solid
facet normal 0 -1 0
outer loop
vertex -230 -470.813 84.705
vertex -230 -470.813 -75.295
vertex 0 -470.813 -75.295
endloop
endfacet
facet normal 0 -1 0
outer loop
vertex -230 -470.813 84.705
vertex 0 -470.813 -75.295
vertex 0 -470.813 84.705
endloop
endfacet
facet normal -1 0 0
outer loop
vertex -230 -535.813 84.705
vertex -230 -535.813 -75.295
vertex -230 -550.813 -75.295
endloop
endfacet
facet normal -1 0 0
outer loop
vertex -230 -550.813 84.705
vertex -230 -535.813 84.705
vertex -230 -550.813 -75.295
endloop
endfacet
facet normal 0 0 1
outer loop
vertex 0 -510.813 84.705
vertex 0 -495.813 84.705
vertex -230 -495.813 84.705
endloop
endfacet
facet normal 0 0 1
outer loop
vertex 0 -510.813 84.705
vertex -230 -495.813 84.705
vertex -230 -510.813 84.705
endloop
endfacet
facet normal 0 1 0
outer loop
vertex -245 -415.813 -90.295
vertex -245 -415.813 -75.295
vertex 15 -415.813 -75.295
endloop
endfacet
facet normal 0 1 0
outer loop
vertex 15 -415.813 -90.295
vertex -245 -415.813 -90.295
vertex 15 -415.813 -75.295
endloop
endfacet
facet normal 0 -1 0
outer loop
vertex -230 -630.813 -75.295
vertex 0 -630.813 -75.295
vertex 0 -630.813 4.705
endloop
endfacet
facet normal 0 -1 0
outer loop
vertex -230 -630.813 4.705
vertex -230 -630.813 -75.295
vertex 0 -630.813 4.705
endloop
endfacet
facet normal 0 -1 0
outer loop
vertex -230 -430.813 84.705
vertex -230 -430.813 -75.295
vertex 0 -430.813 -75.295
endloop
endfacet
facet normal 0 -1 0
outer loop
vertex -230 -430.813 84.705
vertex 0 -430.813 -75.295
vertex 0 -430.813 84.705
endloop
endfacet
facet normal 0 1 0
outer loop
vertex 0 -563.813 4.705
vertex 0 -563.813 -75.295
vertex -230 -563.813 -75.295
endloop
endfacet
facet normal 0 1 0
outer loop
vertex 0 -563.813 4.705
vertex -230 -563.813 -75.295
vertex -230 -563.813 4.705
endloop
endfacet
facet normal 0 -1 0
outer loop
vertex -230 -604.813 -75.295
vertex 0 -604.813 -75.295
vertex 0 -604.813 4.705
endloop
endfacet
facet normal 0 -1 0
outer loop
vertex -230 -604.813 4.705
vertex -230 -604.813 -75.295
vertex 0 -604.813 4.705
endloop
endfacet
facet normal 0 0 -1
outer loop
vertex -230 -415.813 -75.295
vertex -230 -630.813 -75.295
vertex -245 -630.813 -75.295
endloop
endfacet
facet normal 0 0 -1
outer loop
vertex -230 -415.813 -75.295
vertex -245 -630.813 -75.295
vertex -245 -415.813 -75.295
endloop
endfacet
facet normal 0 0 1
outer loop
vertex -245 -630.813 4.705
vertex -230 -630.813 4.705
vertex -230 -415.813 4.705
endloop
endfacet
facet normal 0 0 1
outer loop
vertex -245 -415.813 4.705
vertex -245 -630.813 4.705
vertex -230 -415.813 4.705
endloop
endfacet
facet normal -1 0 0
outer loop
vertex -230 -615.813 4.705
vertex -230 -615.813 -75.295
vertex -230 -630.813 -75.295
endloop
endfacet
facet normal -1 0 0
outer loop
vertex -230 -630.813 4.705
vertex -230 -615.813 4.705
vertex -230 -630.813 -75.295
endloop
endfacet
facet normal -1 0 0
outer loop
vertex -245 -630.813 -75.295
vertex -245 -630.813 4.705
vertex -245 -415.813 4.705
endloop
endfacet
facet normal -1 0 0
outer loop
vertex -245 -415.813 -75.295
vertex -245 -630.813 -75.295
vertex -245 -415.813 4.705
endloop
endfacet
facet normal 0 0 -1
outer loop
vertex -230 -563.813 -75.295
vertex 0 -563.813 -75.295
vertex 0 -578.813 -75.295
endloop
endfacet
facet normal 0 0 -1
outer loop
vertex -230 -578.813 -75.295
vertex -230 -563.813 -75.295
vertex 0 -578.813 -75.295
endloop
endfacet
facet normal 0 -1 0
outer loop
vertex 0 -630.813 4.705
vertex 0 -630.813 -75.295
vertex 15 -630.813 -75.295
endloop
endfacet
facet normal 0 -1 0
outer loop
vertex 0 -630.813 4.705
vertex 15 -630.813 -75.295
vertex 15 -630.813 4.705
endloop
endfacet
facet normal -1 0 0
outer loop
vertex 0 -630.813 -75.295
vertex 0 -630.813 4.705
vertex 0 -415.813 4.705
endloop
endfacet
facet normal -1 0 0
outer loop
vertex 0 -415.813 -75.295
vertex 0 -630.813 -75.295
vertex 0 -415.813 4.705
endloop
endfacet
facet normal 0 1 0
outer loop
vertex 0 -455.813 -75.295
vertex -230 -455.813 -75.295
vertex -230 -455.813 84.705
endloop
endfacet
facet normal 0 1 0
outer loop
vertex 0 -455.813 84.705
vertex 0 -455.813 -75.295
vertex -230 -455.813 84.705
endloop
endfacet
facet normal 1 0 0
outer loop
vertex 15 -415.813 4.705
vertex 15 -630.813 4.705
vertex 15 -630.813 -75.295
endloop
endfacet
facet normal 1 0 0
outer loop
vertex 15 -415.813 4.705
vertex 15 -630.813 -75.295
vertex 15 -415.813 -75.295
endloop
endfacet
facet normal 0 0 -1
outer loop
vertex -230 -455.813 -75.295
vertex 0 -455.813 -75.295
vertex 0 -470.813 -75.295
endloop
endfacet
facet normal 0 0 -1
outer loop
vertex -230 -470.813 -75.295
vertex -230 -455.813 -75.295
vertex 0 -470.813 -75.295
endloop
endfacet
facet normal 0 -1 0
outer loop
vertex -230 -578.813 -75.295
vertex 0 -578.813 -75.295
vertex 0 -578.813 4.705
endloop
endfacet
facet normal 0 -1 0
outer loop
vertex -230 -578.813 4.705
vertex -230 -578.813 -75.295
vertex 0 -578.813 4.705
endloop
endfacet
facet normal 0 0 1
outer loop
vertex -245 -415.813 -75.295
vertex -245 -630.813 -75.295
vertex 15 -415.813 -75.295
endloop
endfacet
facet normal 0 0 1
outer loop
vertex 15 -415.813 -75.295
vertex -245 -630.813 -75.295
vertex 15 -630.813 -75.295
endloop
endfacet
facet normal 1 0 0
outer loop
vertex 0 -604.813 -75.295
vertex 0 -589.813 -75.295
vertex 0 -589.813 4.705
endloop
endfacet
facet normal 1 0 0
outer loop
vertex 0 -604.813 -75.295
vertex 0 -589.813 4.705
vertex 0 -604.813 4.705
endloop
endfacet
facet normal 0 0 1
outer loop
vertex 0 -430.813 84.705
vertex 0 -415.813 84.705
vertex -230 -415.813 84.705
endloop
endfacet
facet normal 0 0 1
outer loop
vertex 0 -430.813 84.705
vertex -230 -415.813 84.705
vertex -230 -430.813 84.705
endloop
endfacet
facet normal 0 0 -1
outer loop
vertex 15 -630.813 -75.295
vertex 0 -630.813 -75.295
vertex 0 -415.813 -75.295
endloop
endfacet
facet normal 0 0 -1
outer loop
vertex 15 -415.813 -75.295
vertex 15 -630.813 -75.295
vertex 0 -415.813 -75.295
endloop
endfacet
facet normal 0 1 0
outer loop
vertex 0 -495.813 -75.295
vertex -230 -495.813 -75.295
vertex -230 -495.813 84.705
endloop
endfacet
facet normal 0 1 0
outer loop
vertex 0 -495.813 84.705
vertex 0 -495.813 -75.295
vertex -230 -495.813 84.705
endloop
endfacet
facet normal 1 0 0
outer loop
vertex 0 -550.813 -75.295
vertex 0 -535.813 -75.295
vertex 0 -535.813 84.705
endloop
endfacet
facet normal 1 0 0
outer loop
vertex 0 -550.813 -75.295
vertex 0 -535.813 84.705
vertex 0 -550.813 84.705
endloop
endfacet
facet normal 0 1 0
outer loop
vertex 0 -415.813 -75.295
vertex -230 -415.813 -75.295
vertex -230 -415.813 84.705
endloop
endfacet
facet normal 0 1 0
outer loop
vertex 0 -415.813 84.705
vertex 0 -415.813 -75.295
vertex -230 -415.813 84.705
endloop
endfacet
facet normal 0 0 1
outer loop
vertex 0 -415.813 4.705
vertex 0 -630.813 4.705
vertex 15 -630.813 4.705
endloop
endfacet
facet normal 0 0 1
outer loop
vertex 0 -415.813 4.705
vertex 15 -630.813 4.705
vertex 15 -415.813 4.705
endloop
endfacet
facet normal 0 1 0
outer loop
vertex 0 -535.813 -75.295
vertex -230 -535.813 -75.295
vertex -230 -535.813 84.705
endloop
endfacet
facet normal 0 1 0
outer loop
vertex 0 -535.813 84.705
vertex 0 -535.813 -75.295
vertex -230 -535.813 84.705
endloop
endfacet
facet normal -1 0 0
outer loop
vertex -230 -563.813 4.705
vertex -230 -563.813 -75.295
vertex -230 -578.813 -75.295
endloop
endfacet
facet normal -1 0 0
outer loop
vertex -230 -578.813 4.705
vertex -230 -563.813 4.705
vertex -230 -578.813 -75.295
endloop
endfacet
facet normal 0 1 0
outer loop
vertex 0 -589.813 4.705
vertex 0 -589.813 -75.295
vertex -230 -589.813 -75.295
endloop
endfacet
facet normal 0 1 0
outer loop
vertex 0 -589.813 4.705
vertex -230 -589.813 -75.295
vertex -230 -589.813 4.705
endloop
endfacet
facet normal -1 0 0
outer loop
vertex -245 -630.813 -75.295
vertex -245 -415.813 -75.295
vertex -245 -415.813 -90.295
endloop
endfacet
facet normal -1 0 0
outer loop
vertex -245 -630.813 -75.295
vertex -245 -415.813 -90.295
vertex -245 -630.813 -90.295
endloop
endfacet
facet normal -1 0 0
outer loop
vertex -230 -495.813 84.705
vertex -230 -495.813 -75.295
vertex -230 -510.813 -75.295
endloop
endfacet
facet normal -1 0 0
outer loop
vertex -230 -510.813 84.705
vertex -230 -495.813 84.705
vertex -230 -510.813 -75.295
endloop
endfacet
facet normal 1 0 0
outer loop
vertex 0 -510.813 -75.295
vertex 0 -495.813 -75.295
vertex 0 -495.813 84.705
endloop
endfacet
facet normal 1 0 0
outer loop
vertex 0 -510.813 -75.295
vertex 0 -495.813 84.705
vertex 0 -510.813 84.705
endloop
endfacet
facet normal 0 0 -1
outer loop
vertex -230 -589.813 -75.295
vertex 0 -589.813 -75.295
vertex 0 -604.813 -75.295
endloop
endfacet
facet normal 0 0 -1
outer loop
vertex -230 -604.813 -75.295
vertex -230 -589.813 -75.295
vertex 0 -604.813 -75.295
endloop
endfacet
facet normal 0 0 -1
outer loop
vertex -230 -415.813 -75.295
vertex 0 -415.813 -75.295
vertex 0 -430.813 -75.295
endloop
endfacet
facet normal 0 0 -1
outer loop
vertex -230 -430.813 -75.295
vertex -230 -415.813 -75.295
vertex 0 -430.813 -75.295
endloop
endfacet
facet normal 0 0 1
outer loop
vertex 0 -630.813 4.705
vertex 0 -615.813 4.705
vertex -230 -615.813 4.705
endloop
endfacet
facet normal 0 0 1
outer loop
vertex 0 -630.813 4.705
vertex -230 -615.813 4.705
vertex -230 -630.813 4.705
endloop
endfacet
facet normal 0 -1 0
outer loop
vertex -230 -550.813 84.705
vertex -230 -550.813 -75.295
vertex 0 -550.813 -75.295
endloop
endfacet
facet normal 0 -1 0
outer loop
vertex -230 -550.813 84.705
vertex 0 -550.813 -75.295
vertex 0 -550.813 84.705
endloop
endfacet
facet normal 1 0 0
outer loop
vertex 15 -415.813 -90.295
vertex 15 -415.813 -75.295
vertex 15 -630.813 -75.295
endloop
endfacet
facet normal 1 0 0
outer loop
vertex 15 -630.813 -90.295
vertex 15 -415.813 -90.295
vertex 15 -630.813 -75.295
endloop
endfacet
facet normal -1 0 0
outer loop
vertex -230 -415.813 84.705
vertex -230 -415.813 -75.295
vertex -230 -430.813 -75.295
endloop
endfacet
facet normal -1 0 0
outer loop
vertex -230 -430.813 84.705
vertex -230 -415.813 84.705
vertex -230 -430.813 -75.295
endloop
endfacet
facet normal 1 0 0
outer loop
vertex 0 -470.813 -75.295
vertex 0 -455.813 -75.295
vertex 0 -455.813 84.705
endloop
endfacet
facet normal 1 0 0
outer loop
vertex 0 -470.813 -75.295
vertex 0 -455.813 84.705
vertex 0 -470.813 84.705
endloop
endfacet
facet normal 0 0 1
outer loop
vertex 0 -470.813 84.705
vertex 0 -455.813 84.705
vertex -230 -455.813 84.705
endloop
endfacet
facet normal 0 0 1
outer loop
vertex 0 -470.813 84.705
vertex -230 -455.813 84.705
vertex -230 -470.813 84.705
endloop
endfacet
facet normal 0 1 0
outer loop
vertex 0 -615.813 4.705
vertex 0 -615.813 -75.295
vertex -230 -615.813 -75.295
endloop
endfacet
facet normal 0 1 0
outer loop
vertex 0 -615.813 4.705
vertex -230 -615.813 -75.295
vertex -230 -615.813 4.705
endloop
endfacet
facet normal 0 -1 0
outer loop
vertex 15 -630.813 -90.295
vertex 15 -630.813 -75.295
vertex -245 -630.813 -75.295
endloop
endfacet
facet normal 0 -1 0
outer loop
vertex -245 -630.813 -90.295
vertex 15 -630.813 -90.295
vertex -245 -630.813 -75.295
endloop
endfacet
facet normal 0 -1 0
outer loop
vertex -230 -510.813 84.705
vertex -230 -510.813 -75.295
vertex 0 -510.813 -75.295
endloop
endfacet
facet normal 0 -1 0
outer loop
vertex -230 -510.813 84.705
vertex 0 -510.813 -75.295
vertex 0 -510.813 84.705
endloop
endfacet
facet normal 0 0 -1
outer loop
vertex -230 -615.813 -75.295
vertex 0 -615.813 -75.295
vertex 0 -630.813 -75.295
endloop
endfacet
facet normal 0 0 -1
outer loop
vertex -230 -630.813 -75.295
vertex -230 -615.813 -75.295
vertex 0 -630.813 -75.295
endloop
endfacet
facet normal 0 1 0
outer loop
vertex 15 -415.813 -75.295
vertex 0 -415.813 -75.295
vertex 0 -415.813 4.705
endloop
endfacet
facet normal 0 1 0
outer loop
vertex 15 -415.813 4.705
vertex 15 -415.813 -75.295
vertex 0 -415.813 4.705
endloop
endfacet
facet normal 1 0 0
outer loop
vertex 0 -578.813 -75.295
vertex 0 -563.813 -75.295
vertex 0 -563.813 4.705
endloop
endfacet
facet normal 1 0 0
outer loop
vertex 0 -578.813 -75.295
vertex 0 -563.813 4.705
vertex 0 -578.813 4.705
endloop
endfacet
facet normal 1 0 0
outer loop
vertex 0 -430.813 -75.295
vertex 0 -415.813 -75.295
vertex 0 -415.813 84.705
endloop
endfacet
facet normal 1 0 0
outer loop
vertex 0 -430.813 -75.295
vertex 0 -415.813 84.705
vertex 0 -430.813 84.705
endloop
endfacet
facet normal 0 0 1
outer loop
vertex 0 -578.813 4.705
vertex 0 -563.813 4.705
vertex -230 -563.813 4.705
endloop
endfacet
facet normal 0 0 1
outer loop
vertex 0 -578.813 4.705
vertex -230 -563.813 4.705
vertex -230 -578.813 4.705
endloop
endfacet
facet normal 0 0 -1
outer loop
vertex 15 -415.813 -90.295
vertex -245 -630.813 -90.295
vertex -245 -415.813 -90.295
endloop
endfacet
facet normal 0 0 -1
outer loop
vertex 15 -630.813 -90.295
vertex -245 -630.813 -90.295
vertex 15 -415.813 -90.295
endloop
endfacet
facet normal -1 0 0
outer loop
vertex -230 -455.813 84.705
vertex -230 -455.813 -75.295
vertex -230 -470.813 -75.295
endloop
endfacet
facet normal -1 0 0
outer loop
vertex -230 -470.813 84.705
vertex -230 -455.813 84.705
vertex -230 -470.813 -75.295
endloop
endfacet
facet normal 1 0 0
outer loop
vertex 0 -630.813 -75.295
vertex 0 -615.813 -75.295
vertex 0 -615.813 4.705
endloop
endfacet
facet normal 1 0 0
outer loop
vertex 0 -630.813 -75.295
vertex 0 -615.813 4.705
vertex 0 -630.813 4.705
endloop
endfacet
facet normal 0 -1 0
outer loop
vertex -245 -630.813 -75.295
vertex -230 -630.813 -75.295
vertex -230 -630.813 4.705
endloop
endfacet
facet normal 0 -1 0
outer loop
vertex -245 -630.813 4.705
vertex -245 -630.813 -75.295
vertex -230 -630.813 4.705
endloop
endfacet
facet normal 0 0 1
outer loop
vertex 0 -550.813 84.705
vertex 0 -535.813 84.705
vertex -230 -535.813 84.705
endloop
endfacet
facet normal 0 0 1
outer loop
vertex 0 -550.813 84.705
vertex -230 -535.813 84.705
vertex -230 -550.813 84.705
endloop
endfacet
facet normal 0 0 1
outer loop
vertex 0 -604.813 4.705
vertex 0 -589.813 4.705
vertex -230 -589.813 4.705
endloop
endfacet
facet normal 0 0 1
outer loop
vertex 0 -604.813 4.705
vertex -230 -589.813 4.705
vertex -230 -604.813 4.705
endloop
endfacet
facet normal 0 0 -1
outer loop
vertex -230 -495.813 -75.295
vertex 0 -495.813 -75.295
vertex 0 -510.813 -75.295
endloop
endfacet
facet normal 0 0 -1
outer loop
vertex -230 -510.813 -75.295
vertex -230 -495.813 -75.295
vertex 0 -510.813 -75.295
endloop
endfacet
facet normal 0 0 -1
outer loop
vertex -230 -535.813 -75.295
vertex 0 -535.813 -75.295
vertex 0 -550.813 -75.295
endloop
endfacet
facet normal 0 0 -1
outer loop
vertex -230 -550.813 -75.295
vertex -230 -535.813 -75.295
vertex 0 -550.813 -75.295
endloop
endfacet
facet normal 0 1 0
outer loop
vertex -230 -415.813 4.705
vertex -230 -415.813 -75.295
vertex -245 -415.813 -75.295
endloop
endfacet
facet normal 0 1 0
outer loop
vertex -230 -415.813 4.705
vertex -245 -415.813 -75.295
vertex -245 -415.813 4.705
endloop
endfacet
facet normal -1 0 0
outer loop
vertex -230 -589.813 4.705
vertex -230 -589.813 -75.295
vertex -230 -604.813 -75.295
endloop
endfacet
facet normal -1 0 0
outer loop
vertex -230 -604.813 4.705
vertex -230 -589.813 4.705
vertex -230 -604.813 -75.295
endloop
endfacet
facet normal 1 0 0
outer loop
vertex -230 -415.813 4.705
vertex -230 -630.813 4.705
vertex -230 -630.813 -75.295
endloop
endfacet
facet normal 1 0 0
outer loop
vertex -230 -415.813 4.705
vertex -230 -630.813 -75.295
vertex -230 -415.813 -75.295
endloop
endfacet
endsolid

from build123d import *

# Parameters (mm, degrees)
F0_W     = 215
F0_H     = 80
F1_DEPTH = 15
F2_W     = 15
F2_H     = 160
F2_H_2   = 80
F3_DEPTH = 230
F6_W     = 15
F6_H     = 215
F6_W_2   = 245
F7_DEPTH = 15


with BuildPart() as f1:
    # F0 (on Right) → F1 (new body)
    with BuildSketch(Plane.YZ):
        with Locations((-523.31306, -35.294824)):
            Rectangle(F0_W, F0_H)
    extrude(amount=F1_DEPTH)


with BuildPart() as f3:
    # F2 (on face) → F3 (new body)
    with BuildSketch(Plane(origin=(0, 0, 0), x_dir=(0, -1, 0), z_dir=(-1, 0, 0))):
        with Locations((423.31306, 4.705176)):
            Rectangle(F2_W, F2_H)
        with Locations((463.31306, 4.705176)):
            Rectangle(F2_W, F2_H)
        with Locations((503.31306, 4.705176)):
            Rectangle(F2_W, F2_H)
        with Locations((543.31306, 4.705176)):
            Rectangle(F2_W, F2_H)
        with Locations((623.31306, -35.294824)):
            Rectangle(F2_W, F2_H_2)
        with Locations((597.31306, -35.294824)):
            Rectangle(F2_W, F2_H_2)
        with Locations((571.31306, -35.294824)):
            Rectangle(F2_W, F2_H_2)
    extrude(amount=F3_DEPTH)


with BuildPart() as f5_1:
    # F5: instance of F1
    add(f1.part.mirror(Plane.YZ.offset(-115)))


with BuildPart() as f7:
    # F6 (on face) → F7 (new body)
    with BuildSketch(Plane(origin=(0, 0, -75.294824), x_dir=(1, 0, 0), z_dir=(0, 0, -1))):
        with Locations((7.5, 523.31306)):
            Rectangle(F6_W, F6_H)
        with Locations((-122.5, 523.31306)):
            Rectangle(F6_W_2, F6_H)
    extrude(amount=F7_DEPTH)


solid = Compound([f1.part, f3.part, f5_1.part, f7.part])
